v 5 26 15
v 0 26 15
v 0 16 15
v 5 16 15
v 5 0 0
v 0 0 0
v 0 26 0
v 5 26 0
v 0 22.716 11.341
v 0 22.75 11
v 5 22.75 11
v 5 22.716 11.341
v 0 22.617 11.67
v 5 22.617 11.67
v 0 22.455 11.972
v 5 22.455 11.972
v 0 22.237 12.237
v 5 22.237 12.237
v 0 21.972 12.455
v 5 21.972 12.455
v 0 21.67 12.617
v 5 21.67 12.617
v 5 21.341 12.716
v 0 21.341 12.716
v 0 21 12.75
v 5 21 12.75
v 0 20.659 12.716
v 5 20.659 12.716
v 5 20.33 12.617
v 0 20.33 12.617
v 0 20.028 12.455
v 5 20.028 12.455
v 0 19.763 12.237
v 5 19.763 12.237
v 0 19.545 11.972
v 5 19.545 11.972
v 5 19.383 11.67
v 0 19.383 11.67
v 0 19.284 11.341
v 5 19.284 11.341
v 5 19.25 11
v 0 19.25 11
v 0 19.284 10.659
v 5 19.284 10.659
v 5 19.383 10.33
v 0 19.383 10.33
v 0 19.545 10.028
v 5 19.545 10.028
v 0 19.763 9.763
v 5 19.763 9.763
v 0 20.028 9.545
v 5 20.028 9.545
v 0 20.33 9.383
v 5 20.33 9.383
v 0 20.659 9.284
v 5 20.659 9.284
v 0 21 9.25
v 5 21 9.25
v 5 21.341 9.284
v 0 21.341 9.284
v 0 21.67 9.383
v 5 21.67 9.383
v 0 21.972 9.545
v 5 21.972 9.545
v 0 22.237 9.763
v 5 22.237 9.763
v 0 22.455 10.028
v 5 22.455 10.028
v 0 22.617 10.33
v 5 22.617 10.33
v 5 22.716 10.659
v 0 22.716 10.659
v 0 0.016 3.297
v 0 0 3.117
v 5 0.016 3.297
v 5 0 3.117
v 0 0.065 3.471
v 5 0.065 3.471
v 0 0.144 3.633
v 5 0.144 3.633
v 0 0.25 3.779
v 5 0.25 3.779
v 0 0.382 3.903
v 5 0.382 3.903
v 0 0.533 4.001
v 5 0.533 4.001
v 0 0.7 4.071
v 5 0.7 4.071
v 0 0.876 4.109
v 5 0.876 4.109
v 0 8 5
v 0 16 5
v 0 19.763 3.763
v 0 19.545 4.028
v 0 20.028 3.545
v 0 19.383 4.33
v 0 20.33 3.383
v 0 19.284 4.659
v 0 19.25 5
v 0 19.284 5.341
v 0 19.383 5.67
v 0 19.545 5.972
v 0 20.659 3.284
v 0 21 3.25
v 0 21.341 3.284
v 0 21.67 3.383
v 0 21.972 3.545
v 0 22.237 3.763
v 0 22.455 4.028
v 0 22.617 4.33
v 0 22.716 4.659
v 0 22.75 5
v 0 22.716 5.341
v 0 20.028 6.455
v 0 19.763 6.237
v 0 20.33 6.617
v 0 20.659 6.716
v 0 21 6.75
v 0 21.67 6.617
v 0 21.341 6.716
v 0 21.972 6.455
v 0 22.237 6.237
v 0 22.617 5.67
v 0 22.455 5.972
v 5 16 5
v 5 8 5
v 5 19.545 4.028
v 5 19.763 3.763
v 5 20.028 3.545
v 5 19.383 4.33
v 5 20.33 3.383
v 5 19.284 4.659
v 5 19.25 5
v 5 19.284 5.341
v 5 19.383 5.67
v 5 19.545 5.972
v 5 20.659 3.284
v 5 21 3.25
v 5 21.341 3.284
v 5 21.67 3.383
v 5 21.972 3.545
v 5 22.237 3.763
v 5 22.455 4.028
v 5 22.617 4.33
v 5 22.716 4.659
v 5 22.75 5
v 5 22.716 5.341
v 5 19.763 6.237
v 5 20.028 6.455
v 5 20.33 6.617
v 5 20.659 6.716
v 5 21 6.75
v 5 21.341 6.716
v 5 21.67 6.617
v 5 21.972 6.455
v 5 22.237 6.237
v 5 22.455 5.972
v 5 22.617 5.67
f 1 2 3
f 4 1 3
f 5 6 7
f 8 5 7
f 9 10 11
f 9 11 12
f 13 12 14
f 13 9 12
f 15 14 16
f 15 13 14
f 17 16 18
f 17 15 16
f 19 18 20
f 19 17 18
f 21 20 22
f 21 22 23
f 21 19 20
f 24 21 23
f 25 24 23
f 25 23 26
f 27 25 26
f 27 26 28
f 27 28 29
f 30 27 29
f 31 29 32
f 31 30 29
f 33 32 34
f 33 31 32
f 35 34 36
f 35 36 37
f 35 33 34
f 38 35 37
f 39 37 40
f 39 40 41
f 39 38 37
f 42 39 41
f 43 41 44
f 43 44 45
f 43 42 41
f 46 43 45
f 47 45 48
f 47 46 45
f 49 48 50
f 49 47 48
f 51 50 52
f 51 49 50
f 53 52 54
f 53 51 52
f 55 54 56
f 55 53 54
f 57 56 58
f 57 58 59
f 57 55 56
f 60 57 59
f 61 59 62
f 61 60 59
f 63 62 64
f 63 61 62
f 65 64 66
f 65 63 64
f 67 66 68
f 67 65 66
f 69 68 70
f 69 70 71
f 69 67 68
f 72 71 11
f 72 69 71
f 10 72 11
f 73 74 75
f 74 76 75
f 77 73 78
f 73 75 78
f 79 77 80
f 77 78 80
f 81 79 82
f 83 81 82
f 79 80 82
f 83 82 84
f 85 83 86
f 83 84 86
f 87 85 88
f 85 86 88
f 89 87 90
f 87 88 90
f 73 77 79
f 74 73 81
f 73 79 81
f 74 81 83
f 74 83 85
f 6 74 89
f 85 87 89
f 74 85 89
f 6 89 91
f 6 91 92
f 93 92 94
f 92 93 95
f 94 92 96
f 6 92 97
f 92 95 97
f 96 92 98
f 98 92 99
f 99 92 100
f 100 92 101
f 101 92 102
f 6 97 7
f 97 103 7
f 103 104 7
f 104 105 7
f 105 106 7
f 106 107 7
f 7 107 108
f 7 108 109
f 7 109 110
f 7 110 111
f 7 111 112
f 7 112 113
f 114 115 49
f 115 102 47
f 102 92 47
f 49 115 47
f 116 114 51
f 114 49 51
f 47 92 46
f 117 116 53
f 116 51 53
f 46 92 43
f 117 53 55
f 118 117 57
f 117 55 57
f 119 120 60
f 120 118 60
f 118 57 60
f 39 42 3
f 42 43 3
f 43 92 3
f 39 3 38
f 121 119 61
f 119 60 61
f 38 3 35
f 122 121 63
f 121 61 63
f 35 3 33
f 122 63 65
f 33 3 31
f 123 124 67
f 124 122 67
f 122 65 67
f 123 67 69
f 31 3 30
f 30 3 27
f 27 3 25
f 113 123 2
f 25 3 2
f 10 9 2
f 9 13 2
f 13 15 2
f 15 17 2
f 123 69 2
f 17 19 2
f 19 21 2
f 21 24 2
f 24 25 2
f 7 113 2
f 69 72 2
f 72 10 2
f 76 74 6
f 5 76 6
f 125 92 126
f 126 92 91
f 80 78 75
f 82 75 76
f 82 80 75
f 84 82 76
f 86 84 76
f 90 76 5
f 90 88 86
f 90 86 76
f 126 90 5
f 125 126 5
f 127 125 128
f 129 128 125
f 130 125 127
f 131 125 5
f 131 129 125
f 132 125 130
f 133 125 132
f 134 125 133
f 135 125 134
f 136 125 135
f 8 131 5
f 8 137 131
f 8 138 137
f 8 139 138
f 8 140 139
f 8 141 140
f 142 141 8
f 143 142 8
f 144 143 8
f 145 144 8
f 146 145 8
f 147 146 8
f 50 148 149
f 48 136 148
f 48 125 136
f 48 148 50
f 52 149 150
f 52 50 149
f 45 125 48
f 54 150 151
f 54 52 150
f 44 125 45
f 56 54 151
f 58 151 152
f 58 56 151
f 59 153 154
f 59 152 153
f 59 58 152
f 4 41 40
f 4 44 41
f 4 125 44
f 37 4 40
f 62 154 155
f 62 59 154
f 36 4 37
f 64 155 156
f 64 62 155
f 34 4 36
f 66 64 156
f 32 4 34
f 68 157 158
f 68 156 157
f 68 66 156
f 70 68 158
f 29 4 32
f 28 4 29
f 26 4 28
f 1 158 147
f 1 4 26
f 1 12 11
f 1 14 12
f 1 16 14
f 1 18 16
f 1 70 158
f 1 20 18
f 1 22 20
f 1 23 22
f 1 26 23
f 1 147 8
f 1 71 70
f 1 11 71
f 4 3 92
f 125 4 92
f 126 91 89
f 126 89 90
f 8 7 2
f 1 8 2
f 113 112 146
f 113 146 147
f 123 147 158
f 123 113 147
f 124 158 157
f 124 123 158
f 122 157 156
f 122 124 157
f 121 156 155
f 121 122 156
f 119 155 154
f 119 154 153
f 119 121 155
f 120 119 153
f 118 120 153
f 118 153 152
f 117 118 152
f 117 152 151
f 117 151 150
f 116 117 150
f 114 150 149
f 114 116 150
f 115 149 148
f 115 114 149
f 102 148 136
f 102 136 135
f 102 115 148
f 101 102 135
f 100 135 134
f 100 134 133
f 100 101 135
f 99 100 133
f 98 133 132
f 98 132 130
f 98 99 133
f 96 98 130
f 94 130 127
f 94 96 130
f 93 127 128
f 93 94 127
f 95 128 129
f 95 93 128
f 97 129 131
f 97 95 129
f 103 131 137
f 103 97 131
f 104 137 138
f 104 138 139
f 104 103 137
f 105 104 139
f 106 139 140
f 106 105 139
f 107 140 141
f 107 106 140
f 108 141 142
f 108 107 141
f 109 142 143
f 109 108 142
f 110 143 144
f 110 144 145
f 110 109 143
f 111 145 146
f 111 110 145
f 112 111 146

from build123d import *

# Parameters (mm, degrees)
F0_R     = 1.75
F1_DEPTH = 5
F2_SIZE2 = 8
F2_SIZE  = 1
F3_R     = 1


with BuildPart() as f1:
    # F0 (on Right) → F1 (new body)
    with BuildSketch(Plane.YZ):
        Polygon((0, 5), (0, 0), (26, 0), (26, 15), (16, 15), (16, 5), align=None)
        with Locations((21, 5)):
            Circle(F0_R, mode=Mode.SUBTRACT)
        with Locations((21, 11)):
            Circle(F0_R, mode=Mode.SUBTRACT)
    extrude(amount=F1_DEPTH)

    # F2
    f2_edges = [f1.edges().sort_by_distance(p)[0] for p in [
        (2.5, 0, 5),
    ]]
    f2_side = f1.faces().sort_by_distance((2.5, 0, 2.5))[0]
    chamfer(f2_edges, length=F2_SIZE, length2=F2_SIZE2, reference=f2_side)

    # F3
    f3_edges = [f1.edges().sort_by_distance(p)[0] for p in [
        (2.5, 0, 4),
    ]]
    fillet(f3_edges, radius=F3_R)


solid = f1.part
